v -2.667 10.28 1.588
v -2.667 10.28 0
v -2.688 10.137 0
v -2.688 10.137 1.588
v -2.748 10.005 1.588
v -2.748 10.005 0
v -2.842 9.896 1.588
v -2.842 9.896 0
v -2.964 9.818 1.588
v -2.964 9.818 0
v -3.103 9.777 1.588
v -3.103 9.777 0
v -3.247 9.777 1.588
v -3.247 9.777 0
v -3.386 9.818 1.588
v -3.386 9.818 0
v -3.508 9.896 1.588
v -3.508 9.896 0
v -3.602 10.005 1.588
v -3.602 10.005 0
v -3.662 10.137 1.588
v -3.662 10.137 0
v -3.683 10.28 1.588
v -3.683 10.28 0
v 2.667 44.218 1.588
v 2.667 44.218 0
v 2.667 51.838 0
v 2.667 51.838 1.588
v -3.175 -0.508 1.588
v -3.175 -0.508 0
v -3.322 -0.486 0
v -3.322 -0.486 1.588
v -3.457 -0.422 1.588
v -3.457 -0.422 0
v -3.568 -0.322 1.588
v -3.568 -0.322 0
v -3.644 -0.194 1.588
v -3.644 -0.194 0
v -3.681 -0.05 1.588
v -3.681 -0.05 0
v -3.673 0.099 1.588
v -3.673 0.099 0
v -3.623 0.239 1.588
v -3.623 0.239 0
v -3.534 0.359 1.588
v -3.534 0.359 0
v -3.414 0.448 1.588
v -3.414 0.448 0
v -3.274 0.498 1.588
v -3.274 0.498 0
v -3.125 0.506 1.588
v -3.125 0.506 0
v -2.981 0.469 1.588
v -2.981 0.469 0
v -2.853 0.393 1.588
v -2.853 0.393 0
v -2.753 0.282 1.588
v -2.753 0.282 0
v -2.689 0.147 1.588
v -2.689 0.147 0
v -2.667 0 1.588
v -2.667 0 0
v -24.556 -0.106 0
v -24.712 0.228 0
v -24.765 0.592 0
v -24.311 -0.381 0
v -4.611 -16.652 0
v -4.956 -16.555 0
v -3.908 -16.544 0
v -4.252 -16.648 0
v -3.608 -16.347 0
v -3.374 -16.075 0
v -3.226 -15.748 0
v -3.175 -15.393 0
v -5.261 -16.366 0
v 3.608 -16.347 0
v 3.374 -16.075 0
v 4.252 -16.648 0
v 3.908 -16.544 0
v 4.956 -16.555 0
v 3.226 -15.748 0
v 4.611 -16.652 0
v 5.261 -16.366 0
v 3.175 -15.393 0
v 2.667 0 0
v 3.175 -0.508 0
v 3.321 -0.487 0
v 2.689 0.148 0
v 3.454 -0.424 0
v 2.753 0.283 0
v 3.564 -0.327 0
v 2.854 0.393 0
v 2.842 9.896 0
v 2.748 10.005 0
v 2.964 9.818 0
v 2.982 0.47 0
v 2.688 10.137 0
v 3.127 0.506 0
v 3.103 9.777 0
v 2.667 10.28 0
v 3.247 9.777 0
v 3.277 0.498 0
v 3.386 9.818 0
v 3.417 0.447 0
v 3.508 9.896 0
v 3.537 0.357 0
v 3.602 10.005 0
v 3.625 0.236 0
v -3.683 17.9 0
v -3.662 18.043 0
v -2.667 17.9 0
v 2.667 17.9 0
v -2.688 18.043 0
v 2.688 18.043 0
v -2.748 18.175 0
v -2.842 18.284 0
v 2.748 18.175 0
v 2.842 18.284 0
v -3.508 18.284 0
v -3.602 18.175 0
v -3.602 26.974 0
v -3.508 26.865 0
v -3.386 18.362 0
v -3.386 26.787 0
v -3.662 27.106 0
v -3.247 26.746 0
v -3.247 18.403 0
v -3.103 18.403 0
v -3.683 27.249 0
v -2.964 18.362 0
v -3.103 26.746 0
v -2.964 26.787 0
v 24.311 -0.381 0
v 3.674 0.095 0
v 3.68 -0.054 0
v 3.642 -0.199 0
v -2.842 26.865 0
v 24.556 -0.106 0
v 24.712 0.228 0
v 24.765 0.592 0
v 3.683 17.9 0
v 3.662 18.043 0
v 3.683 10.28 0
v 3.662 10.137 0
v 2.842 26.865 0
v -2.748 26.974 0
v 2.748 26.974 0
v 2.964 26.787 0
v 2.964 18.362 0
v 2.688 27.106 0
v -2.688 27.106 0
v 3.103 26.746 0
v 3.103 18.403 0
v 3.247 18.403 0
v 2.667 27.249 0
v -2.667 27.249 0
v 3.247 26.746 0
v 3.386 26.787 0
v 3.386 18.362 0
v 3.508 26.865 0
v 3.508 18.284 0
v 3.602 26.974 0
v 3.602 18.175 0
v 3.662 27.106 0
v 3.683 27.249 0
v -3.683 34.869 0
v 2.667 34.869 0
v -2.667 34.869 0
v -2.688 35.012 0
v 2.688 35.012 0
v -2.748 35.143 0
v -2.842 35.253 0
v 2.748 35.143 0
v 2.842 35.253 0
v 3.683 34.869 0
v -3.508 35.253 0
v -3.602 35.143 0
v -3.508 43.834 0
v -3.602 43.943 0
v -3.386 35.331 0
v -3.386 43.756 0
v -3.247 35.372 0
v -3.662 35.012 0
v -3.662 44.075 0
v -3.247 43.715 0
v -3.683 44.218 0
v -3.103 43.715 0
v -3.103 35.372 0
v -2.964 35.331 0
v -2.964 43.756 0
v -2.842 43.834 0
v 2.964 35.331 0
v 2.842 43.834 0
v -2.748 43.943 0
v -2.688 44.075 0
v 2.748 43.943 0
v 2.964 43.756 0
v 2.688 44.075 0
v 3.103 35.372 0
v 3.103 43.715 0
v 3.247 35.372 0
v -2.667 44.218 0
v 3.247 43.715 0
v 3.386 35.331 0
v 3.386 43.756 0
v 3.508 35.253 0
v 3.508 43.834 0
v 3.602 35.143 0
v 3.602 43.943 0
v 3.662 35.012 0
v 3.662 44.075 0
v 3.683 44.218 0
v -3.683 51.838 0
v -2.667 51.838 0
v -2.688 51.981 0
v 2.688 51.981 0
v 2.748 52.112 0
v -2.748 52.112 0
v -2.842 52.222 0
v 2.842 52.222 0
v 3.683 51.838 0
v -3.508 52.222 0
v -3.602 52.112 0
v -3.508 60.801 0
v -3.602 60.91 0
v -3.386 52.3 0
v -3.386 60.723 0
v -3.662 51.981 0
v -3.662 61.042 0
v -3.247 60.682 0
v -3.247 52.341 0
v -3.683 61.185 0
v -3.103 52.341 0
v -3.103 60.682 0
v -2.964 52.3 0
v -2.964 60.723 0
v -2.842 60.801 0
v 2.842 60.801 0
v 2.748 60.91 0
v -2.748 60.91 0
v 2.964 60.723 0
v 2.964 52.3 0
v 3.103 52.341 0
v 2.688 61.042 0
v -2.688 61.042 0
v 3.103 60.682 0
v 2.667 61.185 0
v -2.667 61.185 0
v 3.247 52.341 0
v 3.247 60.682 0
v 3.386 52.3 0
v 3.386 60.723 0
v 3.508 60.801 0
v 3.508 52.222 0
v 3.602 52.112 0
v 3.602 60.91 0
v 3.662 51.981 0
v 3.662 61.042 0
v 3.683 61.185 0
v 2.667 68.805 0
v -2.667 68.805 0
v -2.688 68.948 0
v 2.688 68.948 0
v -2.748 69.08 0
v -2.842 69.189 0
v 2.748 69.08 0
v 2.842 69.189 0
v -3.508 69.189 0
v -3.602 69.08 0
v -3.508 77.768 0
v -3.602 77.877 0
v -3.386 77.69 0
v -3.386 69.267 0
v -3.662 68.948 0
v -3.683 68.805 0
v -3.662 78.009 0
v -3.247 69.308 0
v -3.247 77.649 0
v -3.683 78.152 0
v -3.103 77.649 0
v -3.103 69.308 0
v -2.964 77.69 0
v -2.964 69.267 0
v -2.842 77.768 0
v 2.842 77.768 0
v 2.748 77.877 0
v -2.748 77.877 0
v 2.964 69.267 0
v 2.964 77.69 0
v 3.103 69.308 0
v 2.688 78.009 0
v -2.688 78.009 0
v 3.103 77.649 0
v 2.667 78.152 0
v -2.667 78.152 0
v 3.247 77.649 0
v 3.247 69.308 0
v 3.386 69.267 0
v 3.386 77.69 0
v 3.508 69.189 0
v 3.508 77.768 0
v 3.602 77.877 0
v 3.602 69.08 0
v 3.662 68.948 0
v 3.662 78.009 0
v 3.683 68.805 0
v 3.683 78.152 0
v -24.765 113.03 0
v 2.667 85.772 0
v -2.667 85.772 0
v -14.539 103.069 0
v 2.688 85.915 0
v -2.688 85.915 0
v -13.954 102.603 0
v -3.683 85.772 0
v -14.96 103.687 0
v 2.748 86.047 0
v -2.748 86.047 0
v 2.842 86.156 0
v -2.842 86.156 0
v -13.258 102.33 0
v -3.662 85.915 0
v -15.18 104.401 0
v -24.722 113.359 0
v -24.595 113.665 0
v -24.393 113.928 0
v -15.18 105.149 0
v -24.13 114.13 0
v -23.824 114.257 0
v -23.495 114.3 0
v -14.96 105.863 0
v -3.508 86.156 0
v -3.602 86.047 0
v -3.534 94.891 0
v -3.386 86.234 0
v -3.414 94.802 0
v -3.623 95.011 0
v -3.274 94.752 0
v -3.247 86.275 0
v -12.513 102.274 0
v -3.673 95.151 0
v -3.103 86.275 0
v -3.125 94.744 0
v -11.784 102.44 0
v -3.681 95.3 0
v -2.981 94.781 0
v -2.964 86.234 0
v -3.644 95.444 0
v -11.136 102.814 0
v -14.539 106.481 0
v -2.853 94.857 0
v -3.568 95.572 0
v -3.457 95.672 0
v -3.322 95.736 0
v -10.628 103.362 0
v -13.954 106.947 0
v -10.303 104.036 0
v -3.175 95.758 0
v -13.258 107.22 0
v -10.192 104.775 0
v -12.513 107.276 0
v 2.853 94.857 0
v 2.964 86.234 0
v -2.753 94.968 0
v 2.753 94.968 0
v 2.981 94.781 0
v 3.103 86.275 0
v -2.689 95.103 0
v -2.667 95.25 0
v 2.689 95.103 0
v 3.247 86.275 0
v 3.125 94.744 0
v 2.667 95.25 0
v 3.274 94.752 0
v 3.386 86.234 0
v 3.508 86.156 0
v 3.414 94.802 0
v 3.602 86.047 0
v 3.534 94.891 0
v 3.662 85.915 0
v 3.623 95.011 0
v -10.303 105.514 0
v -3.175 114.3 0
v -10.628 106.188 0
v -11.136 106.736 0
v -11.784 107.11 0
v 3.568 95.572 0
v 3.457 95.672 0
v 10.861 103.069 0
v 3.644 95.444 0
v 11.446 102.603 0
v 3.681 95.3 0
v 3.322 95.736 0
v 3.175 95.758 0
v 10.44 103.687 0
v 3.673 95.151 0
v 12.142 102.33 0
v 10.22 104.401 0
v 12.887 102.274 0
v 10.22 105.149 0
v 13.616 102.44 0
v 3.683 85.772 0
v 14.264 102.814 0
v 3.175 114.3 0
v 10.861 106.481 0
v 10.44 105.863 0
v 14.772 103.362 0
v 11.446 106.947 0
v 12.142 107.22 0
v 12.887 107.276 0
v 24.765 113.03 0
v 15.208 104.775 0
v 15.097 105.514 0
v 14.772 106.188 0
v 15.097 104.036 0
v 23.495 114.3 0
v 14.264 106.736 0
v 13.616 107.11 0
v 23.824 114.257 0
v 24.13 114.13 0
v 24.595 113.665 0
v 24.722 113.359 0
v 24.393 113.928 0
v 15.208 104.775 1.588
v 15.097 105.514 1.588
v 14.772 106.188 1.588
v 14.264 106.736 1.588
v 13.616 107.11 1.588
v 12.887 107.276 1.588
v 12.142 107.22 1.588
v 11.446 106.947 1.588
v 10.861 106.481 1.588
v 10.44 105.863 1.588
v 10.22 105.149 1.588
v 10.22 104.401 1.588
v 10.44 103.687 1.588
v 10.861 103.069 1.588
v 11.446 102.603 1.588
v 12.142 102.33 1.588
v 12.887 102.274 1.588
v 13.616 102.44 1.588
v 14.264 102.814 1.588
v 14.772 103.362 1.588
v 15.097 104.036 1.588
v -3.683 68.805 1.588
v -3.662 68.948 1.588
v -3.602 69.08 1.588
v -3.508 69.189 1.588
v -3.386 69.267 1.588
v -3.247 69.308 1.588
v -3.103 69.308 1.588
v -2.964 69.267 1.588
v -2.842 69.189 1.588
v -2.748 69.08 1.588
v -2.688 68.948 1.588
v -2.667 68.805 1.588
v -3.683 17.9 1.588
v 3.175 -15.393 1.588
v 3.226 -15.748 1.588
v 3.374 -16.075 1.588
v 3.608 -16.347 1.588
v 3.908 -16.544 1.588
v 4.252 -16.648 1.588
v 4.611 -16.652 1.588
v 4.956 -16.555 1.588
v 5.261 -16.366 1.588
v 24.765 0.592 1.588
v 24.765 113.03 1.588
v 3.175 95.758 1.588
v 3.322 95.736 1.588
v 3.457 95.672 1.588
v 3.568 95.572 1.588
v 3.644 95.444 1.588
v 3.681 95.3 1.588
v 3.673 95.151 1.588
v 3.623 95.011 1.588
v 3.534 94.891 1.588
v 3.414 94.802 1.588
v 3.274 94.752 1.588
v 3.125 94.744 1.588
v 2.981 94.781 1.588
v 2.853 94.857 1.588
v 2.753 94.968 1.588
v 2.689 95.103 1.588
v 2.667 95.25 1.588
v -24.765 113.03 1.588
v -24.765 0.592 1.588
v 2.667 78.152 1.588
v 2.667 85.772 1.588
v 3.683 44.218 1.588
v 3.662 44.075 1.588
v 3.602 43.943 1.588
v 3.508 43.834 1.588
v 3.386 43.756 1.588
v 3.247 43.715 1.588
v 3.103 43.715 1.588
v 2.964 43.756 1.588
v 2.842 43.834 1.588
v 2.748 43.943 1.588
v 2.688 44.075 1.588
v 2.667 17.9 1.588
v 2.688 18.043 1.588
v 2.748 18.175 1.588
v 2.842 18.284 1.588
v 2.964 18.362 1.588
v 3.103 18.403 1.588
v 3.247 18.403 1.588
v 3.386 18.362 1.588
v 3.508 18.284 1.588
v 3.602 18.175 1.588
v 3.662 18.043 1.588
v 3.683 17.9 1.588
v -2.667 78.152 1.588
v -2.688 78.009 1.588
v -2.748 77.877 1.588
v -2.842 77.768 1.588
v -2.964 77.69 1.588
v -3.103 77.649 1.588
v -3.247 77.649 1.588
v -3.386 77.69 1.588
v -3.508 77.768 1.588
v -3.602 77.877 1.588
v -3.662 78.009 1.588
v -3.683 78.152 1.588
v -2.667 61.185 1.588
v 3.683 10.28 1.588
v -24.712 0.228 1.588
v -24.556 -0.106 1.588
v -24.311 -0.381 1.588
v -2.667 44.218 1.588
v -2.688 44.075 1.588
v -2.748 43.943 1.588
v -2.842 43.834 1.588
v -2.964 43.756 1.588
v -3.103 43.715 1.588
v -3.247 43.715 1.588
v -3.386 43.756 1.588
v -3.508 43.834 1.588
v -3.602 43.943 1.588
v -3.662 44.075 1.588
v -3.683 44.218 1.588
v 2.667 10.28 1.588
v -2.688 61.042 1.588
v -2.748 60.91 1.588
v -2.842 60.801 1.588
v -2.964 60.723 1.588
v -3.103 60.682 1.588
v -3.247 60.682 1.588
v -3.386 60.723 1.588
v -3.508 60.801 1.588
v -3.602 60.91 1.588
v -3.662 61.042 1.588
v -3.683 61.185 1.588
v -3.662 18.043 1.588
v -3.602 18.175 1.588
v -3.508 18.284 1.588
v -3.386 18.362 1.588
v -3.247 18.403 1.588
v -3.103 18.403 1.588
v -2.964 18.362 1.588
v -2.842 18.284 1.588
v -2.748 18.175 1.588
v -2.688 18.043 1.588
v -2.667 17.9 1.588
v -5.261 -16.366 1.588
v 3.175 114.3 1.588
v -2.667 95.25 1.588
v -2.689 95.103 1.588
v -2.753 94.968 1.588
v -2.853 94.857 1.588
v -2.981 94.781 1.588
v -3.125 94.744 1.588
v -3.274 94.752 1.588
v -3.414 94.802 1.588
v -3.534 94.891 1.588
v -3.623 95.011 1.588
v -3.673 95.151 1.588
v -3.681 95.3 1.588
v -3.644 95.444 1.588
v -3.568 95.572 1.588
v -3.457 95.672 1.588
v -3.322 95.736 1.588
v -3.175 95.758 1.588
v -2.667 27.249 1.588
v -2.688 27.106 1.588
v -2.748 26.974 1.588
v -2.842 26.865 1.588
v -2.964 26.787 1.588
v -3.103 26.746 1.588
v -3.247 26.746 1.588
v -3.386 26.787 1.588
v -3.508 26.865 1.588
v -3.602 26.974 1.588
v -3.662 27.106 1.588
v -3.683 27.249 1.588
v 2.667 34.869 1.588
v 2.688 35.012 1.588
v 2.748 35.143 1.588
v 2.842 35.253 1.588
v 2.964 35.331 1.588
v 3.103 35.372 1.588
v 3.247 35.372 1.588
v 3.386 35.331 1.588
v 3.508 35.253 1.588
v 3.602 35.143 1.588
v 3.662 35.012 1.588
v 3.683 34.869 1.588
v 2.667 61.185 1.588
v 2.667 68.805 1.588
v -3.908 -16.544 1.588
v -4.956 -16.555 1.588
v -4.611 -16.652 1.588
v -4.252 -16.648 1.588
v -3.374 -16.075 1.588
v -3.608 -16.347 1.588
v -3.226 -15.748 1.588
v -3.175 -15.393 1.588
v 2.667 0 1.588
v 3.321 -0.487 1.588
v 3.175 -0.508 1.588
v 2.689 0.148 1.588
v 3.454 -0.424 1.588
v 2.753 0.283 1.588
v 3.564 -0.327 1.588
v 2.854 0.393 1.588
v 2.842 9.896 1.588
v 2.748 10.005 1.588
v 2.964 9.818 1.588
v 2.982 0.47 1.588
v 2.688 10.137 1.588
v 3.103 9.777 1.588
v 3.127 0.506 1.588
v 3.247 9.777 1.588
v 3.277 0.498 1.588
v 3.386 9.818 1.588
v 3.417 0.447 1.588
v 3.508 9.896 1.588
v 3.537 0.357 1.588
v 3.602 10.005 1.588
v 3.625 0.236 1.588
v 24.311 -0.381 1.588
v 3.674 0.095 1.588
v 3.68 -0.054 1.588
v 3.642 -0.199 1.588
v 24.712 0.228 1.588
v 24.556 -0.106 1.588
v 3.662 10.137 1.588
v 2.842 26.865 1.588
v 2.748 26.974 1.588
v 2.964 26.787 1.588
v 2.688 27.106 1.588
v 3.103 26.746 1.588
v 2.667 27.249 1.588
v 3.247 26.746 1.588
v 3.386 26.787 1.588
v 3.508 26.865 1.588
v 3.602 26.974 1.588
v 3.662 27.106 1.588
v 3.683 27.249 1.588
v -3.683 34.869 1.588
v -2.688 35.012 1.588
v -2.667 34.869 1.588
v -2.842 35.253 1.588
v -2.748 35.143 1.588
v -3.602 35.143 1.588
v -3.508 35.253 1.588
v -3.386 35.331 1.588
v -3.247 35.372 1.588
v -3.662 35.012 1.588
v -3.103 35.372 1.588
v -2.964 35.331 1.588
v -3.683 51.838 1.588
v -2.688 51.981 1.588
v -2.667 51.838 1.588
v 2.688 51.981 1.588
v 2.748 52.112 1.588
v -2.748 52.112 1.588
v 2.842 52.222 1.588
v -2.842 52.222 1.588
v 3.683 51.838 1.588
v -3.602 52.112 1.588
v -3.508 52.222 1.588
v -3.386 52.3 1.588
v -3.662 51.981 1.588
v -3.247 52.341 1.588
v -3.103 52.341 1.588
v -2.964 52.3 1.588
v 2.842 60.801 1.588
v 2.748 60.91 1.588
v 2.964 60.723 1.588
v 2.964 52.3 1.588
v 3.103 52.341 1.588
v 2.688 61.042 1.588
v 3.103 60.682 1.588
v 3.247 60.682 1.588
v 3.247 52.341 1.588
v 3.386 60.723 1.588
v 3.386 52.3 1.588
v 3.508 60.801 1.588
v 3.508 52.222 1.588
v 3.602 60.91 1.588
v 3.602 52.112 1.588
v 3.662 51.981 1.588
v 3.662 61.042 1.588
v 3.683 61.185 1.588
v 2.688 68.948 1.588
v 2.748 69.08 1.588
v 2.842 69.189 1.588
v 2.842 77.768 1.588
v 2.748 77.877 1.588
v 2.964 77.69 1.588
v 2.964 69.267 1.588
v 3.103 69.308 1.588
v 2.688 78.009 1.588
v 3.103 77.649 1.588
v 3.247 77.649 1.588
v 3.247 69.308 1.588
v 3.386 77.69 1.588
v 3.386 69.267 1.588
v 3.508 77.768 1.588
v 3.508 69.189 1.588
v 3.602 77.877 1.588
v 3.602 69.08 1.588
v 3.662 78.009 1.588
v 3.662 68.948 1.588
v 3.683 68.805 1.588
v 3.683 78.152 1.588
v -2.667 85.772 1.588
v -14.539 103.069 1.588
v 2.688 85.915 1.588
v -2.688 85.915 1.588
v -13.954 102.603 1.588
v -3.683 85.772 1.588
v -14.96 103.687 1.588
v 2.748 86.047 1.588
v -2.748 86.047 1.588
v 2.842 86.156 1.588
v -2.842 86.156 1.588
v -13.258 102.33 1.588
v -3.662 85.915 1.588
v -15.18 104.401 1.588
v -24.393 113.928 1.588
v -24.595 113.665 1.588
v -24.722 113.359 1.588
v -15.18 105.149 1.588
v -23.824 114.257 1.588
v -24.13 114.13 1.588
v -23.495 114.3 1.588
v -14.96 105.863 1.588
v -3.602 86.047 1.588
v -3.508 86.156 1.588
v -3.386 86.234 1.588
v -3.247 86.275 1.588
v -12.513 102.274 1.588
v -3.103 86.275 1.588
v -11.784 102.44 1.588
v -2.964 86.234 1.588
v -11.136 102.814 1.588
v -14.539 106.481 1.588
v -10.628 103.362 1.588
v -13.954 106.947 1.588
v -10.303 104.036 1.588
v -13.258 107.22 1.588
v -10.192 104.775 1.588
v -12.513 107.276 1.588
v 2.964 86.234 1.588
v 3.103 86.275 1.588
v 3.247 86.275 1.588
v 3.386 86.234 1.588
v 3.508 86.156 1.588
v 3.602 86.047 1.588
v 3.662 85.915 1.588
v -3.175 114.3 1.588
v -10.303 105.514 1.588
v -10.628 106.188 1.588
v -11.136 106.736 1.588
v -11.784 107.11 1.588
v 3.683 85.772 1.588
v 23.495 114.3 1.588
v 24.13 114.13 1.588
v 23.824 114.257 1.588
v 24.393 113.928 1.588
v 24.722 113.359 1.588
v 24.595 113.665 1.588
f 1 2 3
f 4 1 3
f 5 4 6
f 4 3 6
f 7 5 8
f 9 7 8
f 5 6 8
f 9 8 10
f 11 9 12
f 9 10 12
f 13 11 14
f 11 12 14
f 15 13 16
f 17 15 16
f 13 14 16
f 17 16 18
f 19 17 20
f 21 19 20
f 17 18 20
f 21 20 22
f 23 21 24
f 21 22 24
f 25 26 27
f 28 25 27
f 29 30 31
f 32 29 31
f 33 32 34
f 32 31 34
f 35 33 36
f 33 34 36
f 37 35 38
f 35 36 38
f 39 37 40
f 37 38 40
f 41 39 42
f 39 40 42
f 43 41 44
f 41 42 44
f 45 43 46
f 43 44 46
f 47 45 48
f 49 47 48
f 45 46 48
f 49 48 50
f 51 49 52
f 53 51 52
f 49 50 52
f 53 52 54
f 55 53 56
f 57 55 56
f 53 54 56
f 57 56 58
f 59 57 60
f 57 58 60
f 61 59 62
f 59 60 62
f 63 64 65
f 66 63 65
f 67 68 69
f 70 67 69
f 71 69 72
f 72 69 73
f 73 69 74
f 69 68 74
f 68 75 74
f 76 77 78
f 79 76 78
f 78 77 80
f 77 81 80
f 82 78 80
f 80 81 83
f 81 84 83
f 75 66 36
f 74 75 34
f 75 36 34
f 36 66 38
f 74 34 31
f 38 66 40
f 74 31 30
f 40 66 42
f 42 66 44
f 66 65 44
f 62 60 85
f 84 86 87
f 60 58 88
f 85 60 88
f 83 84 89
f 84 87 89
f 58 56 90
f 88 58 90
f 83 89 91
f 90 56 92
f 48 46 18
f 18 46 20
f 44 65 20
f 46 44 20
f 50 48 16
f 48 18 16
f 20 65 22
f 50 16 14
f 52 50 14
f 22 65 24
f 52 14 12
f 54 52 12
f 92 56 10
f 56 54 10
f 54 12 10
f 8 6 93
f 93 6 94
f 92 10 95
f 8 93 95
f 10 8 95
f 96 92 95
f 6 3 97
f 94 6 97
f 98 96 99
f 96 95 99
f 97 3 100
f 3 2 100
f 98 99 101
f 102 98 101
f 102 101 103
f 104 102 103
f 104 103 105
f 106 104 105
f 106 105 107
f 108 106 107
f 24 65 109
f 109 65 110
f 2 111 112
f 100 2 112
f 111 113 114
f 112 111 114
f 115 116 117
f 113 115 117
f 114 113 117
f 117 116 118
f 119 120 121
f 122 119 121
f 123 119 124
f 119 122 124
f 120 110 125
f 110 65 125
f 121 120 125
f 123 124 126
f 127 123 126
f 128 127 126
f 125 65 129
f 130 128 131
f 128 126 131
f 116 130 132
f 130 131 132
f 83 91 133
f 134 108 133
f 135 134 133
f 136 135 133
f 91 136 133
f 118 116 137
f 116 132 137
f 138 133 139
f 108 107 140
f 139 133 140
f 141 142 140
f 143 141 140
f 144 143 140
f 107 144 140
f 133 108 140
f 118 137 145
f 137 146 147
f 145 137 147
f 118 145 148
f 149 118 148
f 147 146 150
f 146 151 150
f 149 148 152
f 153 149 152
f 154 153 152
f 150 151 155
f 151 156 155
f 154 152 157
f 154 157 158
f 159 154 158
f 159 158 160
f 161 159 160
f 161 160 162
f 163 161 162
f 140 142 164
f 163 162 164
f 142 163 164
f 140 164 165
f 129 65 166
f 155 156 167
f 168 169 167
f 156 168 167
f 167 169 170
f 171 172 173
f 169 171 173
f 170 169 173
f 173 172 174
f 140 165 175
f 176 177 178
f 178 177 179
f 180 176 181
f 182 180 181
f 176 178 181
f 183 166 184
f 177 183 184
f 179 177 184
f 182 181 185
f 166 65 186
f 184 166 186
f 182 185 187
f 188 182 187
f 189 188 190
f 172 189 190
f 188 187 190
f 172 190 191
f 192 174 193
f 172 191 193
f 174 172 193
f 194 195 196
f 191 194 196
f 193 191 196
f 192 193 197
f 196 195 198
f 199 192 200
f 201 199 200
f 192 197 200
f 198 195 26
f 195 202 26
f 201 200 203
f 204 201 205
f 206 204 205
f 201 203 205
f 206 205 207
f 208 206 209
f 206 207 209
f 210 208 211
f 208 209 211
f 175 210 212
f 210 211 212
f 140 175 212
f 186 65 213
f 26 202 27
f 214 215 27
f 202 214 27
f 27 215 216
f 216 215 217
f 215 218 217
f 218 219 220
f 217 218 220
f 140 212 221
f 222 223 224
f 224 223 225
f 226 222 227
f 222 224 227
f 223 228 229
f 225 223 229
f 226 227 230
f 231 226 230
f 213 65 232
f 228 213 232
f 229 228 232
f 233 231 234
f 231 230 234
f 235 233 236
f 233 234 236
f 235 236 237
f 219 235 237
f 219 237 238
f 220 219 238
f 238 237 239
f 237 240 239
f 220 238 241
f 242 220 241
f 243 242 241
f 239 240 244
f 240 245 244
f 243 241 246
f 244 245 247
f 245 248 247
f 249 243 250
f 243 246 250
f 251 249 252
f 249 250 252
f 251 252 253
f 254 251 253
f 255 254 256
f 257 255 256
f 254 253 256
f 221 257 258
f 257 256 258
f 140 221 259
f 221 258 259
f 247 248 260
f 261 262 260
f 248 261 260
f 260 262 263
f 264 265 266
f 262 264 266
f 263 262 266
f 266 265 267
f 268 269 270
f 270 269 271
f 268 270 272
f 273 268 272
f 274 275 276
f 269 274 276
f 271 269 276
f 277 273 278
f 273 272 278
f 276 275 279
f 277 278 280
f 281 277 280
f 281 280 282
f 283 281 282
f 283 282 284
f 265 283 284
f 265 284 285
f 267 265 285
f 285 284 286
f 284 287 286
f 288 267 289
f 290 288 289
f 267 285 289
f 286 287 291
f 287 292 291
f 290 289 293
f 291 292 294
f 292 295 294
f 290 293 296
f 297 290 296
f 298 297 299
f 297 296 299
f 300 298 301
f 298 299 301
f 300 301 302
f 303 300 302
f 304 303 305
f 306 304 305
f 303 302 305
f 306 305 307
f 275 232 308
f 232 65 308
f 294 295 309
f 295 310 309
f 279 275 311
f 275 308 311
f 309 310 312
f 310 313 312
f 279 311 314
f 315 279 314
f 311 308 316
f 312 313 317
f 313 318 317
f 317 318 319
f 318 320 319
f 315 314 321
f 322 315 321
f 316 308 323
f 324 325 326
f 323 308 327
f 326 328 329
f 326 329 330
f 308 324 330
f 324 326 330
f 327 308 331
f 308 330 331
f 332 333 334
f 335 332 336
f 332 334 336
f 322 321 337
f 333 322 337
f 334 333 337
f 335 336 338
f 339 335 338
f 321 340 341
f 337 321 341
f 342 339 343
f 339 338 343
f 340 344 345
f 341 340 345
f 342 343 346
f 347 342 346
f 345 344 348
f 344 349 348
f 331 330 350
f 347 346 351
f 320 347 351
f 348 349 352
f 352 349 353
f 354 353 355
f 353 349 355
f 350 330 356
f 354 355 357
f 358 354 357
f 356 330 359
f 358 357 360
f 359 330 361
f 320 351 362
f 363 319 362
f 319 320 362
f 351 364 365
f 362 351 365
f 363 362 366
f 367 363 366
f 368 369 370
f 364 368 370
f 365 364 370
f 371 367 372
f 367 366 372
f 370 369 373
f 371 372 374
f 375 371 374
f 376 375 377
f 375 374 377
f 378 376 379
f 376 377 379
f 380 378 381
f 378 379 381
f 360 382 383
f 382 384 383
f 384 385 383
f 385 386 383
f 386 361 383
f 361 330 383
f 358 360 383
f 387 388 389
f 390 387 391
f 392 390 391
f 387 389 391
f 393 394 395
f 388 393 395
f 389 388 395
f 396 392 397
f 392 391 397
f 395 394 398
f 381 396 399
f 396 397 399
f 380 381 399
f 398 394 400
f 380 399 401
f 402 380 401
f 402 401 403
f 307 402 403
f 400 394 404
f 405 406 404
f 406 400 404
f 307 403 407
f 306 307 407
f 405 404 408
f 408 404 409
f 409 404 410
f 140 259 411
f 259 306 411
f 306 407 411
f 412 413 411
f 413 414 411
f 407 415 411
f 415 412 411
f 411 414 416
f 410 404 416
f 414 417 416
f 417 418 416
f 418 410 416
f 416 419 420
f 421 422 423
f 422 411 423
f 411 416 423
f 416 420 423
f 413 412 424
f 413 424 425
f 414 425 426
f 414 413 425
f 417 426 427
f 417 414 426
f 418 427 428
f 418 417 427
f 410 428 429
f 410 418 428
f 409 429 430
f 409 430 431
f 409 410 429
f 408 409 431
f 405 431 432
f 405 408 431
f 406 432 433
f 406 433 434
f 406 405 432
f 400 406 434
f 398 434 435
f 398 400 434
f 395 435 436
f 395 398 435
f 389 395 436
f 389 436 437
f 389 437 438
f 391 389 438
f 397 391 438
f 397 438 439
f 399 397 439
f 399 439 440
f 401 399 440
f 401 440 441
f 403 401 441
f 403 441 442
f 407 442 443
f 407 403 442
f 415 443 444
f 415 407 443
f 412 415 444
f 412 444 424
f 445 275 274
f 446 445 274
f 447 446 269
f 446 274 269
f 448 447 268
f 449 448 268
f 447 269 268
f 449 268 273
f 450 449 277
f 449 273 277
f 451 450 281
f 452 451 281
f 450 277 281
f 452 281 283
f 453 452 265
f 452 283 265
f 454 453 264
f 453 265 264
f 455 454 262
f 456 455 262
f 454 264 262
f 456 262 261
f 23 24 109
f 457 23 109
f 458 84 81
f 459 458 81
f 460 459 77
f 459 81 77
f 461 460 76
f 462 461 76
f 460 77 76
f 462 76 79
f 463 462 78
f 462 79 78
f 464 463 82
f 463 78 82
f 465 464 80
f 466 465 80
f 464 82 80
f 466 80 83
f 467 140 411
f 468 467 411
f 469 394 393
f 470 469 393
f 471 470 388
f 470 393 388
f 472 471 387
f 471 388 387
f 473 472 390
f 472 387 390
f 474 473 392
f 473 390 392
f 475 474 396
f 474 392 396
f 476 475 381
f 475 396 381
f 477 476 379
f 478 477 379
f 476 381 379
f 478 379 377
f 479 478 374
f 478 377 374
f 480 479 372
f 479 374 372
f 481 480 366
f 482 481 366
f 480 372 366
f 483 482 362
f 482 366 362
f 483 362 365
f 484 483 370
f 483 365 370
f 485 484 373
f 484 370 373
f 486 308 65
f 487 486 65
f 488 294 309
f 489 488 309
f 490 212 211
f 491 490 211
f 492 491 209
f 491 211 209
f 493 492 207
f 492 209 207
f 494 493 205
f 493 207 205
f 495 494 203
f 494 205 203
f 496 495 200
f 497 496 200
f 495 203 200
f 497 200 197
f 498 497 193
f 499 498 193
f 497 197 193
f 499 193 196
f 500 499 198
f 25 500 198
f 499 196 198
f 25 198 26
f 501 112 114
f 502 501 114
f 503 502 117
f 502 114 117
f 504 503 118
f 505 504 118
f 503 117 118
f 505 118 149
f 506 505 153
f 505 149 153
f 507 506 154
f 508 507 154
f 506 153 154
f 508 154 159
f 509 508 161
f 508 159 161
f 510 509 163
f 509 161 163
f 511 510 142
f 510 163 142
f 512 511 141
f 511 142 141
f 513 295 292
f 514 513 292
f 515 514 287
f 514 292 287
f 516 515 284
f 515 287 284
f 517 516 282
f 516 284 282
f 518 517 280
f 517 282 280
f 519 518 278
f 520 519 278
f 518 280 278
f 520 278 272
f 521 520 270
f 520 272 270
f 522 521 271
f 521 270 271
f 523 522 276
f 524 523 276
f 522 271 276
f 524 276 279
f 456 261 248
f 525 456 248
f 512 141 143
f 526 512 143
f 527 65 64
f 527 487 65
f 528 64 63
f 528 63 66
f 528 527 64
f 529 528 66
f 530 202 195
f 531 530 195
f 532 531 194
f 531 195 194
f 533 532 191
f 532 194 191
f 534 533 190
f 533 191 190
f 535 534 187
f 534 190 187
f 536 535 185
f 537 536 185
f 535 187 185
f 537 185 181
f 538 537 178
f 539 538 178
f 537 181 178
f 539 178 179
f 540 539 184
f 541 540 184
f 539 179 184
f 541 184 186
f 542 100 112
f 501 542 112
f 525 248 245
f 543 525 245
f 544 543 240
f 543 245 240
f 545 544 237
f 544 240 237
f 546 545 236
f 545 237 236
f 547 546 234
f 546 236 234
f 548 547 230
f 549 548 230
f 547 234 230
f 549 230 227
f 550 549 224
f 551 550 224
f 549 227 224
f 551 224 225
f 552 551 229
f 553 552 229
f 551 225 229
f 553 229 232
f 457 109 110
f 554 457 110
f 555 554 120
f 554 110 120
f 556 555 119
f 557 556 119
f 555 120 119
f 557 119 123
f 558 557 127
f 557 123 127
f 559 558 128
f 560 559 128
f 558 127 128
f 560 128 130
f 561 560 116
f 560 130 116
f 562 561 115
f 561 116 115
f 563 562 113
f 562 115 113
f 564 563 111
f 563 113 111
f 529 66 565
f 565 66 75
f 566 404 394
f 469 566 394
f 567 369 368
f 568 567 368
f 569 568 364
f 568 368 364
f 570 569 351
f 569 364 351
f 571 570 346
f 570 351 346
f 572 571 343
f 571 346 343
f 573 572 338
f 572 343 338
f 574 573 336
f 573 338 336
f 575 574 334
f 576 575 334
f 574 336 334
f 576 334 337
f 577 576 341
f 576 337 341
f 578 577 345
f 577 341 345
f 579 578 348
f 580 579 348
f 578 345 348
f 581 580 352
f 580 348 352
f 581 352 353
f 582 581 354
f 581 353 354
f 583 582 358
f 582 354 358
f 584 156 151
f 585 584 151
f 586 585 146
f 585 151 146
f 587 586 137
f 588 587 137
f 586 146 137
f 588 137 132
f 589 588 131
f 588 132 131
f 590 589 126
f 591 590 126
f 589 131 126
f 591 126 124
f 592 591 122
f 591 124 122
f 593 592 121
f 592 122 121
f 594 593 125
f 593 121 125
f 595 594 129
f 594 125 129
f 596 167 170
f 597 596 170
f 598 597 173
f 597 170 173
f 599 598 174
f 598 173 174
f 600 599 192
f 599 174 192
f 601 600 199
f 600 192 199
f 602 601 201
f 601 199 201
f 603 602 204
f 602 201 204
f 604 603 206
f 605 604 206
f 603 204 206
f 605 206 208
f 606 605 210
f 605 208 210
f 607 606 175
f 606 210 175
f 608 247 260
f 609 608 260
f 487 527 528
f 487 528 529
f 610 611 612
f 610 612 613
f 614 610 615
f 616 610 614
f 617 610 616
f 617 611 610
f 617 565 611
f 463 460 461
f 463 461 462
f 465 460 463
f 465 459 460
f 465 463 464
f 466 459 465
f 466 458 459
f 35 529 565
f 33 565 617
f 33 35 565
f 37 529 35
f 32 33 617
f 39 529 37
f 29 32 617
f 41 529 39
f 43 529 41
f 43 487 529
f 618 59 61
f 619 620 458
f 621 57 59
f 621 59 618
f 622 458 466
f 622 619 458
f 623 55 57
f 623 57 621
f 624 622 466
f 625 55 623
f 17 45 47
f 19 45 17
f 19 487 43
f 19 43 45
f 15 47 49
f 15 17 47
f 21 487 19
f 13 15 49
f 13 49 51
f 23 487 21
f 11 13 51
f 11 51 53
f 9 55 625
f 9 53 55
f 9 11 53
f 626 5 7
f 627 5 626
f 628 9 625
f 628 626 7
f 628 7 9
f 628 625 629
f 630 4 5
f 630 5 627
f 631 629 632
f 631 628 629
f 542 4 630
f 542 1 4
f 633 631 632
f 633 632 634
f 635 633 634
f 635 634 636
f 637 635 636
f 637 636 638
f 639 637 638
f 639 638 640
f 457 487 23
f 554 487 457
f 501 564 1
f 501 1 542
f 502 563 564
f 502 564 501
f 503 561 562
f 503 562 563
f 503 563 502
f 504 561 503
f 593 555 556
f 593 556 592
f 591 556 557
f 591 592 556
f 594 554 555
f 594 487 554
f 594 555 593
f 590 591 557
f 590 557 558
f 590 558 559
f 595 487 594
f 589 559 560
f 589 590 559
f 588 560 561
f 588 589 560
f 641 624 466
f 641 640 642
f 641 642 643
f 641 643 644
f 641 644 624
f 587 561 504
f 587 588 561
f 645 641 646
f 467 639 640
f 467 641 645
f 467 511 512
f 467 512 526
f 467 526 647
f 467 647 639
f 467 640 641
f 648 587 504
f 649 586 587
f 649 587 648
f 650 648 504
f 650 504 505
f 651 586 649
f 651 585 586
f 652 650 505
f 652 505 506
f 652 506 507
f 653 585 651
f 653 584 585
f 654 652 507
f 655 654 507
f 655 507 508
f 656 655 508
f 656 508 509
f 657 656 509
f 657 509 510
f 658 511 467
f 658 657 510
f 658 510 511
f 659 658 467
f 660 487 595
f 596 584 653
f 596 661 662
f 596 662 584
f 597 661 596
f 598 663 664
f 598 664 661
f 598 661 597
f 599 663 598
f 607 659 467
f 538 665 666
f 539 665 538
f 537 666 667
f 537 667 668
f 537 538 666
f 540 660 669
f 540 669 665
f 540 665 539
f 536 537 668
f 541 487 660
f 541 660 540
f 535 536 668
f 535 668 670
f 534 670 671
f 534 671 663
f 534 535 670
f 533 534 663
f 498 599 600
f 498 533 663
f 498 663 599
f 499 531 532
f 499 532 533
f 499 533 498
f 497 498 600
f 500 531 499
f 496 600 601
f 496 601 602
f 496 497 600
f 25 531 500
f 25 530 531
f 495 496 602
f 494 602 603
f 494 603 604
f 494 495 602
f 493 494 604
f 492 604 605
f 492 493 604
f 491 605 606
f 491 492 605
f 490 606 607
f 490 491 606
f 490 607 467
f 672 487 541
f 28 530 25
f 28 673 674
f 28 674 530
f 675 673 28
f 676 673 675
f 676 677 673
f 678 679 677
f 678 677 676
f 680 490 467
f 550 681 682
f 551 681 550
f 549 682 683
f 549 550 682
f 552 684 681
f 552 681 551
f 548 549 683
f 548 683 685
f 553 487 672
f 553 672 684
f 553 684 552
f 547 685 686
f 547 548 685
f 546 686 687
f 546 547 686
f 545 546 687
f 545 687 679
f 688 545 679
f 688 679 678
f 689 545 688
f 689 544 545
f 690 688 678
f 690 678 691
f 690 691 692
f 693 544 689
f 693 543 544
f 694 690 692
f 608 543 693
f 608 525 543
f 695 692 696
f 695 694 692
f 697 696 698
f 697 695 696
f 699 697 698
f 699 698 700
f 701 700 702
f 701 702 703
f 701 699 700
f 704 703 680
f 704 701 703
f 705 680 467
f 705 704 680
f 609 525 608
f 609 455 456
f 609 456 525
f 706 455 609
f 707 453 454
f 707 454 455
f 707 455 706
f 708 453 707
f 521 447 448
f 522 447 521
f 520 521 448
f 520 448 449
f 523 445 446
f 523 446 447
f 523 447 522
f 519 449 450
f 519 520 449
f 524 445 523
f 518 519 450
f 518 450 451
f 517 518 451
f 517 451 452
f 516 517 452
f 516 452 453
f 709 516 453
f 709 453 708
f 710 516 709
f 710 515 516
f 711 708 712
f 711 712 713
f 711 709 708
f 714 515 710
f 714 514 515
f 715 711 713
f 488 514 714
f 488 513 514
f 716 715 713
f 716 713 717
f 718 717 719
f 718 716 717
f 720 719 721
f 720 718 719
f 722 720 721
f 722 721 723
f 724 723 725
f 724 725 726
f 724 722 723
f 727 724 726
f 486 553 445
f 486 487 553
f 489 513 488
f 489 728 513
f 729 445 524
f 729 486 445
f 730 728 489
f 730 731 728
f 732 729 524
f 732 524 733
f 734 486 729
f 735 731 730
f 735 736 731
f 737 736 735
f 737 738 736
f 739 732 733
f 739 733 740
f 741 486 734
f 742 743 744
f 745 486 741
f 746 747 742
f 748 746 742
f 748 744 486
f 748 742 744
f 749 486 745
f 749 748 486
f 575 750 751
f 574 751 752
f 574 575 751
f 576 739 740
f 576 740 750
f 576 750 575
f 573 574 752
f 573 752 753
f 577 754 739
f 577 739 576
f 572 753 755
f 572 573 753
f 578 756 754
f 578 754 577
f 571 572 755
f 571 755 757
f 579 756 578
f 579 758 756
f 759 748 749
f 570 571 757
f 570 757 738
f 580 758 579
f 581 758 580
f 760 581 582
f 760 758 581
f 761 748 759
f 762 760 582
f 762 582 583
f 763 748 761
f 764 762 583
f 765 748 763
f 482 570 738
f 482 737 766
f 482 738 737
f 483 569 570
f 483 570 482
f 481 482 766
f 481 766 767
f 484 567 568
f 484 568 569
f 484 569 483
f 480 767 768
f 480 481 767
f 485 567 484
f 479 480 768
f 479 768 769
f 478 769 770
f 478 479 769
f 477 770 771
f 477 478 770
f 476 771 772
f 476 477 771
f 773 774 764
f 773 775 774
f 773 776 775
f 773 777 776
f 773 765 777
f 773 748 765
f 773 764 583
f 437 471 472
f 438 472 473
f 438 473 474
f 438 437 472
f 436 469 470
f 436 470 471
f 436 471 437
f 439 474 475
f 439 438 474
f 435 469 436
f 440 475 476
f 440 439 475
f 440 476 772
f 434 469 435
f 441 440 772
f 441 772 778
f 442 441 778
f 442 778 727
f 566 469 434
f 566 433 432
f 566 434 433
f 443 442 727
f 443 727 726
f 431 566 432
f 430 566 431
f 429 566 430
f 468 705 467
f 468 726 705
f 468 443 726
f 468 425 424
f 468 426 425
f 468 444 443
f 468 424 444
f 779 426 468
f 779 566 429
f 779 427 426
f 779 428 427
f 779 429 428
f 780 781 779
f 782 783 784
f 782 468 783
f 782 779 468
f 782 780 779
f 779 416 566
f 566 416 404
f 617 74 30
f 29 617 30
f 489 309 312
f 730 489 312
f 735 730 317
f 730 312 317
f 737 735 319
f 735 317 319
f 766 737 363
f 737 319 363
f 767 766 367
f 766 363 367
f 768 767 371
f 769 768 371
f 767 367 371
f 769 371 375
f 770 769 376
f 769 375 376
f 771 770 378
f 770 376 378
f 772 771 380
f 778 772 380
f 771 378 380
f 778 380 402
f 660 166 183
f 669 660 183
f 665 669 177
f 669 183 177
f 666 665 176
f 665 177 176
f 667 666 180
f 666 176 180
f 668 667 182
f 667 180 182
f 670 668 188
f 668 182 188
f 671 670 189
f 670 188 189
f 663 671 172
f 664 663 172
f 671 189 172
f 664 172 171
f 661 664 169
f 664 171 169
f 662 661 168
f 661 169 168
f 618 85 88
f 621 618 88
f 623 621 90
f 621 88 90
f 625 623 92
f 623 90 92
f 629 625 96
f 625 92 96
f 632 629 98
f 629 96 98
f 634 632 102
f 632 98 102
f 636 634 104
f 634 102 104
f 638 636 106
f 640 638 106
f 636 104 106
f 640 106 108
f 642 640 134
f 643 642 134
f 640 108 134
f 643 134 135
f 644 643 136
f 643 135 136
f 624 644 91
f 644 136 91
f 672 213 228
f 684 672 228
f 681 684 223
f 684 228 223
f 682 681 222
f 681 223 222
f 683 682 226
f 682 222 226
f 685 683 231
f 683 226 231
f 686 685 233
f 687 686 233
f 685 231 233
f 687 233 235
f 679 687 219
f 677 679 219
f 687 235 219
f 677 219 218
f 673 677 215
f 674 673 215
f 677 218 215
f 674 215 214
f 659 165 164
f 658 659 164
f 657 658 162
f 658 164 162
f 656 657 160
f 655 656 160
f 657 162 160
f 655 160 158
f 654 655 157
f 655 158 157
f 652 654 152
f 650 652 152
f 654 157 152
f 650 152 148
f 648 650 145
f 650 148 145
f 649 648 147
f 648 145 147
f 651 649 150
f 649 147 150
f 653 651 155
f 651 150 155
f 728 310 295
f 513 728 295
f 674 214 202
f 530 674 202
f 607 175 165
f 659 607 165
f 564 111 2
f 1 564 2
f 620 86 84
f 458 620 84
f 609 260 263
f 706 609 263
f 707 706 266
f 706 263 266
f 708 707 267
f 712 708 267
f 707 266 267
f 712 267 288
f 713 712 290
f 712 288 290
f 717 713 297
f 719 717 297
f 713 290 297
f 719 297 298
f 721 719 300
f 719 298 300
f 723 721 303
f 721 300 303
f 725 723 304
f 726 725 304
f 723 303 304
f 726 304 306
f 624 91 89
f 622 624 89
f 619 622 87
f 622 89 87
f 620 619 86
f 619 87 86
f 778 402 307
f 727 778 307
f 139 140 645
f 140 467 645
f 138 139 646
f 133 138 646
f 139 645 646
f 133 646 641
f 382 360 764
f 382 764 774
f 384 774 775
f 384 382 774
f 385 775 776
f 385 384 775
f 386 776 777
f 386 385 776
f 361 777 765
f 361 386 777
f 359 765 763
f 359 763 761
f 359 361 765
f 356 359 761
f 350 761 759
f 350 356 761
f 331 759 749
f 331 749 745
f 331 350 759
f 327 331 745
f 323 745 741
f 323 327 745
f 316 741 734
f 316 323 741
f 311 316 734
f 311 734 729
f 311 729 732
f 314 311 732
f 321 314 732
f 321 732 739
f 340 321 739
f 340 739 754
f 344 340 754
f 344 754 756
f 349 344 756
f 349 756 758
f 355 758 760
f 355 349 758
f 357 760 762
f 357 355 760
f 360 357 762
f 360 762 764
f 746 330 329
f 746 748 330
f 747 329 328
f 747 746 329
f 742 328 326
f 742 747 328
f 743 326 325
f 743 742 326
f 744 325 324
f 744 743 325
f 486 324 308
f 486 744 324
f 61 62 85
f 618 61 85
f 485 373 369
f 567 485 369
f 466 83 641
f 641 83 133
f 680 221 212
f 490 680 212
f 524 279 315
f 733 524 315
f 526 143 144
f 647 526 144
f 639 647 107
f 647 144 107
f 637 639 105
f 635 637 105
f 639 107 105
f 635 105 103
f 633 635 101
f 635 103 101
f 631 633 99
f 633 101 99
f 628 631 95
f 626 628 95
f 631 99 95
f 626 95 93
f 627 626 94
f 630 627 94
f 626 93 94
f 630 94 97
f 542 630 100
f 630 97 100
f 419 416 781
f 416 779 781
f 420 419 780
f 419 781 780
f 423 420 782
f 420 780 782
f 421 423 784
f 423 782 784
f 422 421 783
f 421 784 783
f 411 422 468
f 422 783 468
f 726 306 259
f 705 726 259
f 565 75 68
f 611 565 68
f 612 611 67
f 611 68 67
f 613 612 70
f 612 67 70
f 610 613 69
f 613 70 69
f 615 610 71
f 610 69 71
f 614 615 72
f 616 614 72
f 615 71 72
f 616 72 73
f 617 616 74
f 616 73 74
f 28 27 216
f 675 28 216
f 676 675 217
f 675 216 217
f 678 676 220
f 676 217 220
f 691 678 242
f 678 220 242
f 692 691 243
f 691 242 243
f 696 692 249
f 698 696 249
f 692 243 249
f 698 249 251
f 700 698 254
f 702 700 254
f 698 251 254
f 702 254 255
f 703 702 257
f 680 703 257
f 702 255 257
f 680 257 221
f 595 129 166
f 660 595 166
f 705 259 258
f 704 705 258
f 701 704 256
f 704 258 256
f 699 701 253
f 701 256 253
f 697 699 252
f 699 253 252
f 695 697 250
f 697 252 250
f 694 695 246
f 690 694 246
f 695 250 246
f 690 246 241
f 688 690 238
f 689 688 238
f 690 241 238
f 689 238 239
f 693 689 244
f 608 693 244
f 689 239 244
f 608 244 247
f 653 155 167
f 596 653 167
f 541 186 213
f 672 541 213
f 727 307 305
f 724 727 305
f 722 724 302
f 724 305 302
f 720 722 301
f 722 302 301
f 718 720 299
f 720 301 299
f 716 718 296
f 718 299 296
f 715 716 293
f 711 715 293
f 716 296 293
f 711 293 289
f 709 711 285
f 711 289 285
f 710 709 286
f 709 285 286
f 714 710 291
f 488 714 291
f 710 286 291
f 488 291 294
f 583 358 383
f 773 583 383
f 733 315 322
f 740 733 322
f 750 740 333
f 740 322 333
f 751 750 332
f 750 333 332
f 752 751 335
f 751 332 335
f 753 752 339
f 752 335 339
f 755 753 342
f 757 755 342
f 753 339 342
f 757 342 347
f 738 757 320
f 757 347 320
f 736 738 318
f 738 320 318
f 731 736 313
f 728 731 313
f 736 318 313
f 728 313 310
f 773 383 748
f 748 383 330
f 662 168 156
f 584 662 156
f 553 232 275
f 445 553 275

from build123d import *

# Parameters (mm, degrees)
F0_R     = 2.50825
F1_DEPTH = 1.5875
F2_R     = 1.27


with BuildPart() as f1:
    # F0 (on Top) → F1 (new body)
    with BuildSketch(Plane.XY):
        with BuildLine():
            Line((2.667, 95.25), (0, 95.25))
            Line((0, 95.25), (-2.667, 95.25))
            ThreePointArc((-2.667, 95.25), (-3.5342102448, 94.8907897552), (-3.175, 95.758))
            Line((-3.175, 95.758), (-3.175, 114.3))
            Line((-3.175, 114.3), (-24.765, 114.3))
            Line((-24.765, 114.3), (-24.765, 0))
            Line((-24.765, 0), (-5.2613402643, -16.3655136908))
            ThreePointArc((-5.2613402643, -16.3655136908), (-3.9082748076, -16.5436481376), (-3.175, -15.3926372481))
            Line((-3.175, -15.3926372481), (-3.175, -0.508))
            ThreePointArc((-3.175, -0.508), (-3.5342102448, 0.3592102448), (-2.667, 0))
            Line((-2.667, 0), (0, 0))
            Line((0, 0), (2.667, 0))
            ThreePointArc((2.667, 0), (3.3487462328, 0.4773638514), (3.5641505771, -0.3265361057))
            ThreePointArc((3.5641505771, -0.3265361057), (3.389690077, -0.4604043558), (3.175, -0.508))
            Line((3.175, -0.508), (3.175, -15.3926372481))
            ThreePointArc((3.175, -15.3926372481), (3.9082748076, -16.5436481376), (5.2613402643, -16.3655136908))
            Line((5.2613402643, -16.3655136908), (24.765, 0))
            Line((24.765, 0), (24.765, 114.3))
            Line((24.765, 114.3), (3.175, 114.3))
            Line((3.175, 114.3), (3.175, 95.758))
            ThreePointArc((3.175, 95.758), (3.5342102448, 94.8907897552), (2.667, 95.25))
        make_face()
        with BuildLine():
            ThreePointArc((-3.683, 17.8998578738), (-3.175, 18.4078578738), (-2.667, 17.8998578738))
            Line((-2.667, 17.8998578738), (-2.667, 10.2798578738))
            ThreePointArc((-2.667, 10.2798578738), (-3.175, 9.7718578738), (-3.683, 10.2798578738))
            Line((-3.683, 10.2798578738), (-3.683, 17.8998578738))
        make_face(mode=Mode.SUBTRACT)
        with BuildLine():
            ThreePointArc((-3.683, 34.8687778738), (-3.175, 35.3767778738), (-2.667, 34.8687778738))
            Line((-2.667, 34.8687778738), (-2.667, 27.2487778738))
            ThreePointArc((-2.667, 27.2487778738), (-3.175, 26.7407778738), (-3.683, 27.2487778738))
            Line((-3.683, 27.2487778738), (-3.683, 34.8687778738))
        make_face(mode=Mode.SUBTRACT)
        with BuildLine():
            Line((-3.683, 44.2176978738), (-3.683, 51.8376978738))
            ThreePointArc((-3.683, 51.8376978738), (-3.175, 52.3456978738), (-2.667, 51.8376978738))
            Line((-2.667, 51.8376978738), (-2.667, 44.2176978738))
            ThreePointArc((-2.667, 44.2176978738), (-3.175, 43.7096978738), (-3.683, 44.2176978738))
        make_face(mode=Mode.SUBTRACT)
        with BuildLine():
            Line((3.683, 17.8998578738), (3.683, 10.2798578738))
            ThreePointArc((3.683, 10.2798578738), (3.175, 9.7718578738), (2.667, 10.2798578738))
            Line((2.667, 10.2798578738), (2.667, 17.8998578738))
            ThreePointArc((2.667, 17.8998578738), (3.175, 18.4078578738), (3.683, 17.8998578738))
        make_face(mode=Mode.SUBTRACT)
        with BuildLine():
            Line((3.683, 34.8687778738), (3.683, 27.2487778738))
            ThreePointArc((3.683, 27.2487778738), (3.175, 26.7407778738), (2.667, 27.2487778738))
            Line((2.667, 27.2487778738), (2.667, 34.8687778738))
            ThreePointArc((2.667, 34.8687778738), (3.175, 35.3767778738), (3.683, 34.8687778738))
        make_face(mode=Mode.SUBTRACT)
        with BuildLine():
            Line((3.683, 51.8376978738), (3.683, 44.2176978738))
            ThreePointArc((3.683, 44.2176978738), (3.175, 43.7096978738), (2.667, 44.2176978738))
            Line((2.667, 44.2176978738), (2.667, 51.8376978738))
            ThreePointArc((2.667, 51.8376978738), (3.175, 52.3456978738), (3.683, 51.8376978738))
        make_face(mode=Mode.SUBTRACT)
        with BuildLine():
            ThreePointArc((-3.683, 68.8048978738), (-3.175, 69.3128978738), (-2.667, 68.8048978738))
            Line((-2.667, 68.8048978738), (-2.667, 61.1848978738))
            ThreePointArc((-2.667, 61.1848978738), (-3.175, 60.6768978738), (-3.683, 61.1848978738))
            Line((-3.683, 61.1848978738), (-3.683, 68.8048978738))
        make_face(mode=Mode.SUBTRACT)
        with Locations((-12.7, 104.775)):
            Circle(F0_R, mode=Mode.SUBTRACT)
        with BuildLine():
            ThreePointArc((-3.683, 85.7720978738), (-3.175, 86.2800978738), (-2.667, 85.7720978738))
            Line((-2.667, 85.7720978738), (-2.667, 78.1520978738))
            ThreePointArc((-2.667, 78.1520978738), (-3.175, 77.6440978738), (-3.683, 78.1520978738))
            Line((-3.683, 78.1520978738), (-3.683, 85.7720978738))
        make_face(mode=Mode.SUBTRACT)
        with BuildLine():
            Line((3.683, 68.8048978738), (3.683, 61.1848978738))
            ThreePointArc((3.683, 61.1848978738), (3.175, 60.6768978738), (2.667, 61.1848978738))
            Line((2.667, 61.1848978738), (2.667, 68.8048978738))
            ThreePointArc((2.667, 68.8048978738), (3.175, 69.3128978738), (3.683, 68.8048978738))
        make_face(mode=Mode.SUBTRACT)
        with BuildLine():
            Line((3.683, 85.7720978738), (3.683, 78.1520978738))
            ThreePointArc((3.683, 78.1520978738), (3.175, 77.6440978738), (2.667, 78.1520978738))
            Line((2.667, 78.1520978738), (2.667, 85.7720978738))
            ThreePointArc((2.667, 85.7720978738), (3.175, 86.2800978738), (3.683, 85.7720978738))
        make_face(mode=Mode.SUBTRACT)
        with Locations((12.7, 104.775)):
            Circle(F0_R, mode=Mode.SUBTRACT)
    extrude(amount=F1_DEPTH)

    # F2
    f2_edges = [f1.edges().sort_by_distance(p)[0] for p in [
        (24.765, 0, 0.79375),
        (-24.765, 0, 0.79375),
        (-24.765, 114.3, 0.79375),
        (24.765, 114.3, 0.79375),
    ]]
    fillet(f2_edges, radius=F2_R)


solid = f1.part
